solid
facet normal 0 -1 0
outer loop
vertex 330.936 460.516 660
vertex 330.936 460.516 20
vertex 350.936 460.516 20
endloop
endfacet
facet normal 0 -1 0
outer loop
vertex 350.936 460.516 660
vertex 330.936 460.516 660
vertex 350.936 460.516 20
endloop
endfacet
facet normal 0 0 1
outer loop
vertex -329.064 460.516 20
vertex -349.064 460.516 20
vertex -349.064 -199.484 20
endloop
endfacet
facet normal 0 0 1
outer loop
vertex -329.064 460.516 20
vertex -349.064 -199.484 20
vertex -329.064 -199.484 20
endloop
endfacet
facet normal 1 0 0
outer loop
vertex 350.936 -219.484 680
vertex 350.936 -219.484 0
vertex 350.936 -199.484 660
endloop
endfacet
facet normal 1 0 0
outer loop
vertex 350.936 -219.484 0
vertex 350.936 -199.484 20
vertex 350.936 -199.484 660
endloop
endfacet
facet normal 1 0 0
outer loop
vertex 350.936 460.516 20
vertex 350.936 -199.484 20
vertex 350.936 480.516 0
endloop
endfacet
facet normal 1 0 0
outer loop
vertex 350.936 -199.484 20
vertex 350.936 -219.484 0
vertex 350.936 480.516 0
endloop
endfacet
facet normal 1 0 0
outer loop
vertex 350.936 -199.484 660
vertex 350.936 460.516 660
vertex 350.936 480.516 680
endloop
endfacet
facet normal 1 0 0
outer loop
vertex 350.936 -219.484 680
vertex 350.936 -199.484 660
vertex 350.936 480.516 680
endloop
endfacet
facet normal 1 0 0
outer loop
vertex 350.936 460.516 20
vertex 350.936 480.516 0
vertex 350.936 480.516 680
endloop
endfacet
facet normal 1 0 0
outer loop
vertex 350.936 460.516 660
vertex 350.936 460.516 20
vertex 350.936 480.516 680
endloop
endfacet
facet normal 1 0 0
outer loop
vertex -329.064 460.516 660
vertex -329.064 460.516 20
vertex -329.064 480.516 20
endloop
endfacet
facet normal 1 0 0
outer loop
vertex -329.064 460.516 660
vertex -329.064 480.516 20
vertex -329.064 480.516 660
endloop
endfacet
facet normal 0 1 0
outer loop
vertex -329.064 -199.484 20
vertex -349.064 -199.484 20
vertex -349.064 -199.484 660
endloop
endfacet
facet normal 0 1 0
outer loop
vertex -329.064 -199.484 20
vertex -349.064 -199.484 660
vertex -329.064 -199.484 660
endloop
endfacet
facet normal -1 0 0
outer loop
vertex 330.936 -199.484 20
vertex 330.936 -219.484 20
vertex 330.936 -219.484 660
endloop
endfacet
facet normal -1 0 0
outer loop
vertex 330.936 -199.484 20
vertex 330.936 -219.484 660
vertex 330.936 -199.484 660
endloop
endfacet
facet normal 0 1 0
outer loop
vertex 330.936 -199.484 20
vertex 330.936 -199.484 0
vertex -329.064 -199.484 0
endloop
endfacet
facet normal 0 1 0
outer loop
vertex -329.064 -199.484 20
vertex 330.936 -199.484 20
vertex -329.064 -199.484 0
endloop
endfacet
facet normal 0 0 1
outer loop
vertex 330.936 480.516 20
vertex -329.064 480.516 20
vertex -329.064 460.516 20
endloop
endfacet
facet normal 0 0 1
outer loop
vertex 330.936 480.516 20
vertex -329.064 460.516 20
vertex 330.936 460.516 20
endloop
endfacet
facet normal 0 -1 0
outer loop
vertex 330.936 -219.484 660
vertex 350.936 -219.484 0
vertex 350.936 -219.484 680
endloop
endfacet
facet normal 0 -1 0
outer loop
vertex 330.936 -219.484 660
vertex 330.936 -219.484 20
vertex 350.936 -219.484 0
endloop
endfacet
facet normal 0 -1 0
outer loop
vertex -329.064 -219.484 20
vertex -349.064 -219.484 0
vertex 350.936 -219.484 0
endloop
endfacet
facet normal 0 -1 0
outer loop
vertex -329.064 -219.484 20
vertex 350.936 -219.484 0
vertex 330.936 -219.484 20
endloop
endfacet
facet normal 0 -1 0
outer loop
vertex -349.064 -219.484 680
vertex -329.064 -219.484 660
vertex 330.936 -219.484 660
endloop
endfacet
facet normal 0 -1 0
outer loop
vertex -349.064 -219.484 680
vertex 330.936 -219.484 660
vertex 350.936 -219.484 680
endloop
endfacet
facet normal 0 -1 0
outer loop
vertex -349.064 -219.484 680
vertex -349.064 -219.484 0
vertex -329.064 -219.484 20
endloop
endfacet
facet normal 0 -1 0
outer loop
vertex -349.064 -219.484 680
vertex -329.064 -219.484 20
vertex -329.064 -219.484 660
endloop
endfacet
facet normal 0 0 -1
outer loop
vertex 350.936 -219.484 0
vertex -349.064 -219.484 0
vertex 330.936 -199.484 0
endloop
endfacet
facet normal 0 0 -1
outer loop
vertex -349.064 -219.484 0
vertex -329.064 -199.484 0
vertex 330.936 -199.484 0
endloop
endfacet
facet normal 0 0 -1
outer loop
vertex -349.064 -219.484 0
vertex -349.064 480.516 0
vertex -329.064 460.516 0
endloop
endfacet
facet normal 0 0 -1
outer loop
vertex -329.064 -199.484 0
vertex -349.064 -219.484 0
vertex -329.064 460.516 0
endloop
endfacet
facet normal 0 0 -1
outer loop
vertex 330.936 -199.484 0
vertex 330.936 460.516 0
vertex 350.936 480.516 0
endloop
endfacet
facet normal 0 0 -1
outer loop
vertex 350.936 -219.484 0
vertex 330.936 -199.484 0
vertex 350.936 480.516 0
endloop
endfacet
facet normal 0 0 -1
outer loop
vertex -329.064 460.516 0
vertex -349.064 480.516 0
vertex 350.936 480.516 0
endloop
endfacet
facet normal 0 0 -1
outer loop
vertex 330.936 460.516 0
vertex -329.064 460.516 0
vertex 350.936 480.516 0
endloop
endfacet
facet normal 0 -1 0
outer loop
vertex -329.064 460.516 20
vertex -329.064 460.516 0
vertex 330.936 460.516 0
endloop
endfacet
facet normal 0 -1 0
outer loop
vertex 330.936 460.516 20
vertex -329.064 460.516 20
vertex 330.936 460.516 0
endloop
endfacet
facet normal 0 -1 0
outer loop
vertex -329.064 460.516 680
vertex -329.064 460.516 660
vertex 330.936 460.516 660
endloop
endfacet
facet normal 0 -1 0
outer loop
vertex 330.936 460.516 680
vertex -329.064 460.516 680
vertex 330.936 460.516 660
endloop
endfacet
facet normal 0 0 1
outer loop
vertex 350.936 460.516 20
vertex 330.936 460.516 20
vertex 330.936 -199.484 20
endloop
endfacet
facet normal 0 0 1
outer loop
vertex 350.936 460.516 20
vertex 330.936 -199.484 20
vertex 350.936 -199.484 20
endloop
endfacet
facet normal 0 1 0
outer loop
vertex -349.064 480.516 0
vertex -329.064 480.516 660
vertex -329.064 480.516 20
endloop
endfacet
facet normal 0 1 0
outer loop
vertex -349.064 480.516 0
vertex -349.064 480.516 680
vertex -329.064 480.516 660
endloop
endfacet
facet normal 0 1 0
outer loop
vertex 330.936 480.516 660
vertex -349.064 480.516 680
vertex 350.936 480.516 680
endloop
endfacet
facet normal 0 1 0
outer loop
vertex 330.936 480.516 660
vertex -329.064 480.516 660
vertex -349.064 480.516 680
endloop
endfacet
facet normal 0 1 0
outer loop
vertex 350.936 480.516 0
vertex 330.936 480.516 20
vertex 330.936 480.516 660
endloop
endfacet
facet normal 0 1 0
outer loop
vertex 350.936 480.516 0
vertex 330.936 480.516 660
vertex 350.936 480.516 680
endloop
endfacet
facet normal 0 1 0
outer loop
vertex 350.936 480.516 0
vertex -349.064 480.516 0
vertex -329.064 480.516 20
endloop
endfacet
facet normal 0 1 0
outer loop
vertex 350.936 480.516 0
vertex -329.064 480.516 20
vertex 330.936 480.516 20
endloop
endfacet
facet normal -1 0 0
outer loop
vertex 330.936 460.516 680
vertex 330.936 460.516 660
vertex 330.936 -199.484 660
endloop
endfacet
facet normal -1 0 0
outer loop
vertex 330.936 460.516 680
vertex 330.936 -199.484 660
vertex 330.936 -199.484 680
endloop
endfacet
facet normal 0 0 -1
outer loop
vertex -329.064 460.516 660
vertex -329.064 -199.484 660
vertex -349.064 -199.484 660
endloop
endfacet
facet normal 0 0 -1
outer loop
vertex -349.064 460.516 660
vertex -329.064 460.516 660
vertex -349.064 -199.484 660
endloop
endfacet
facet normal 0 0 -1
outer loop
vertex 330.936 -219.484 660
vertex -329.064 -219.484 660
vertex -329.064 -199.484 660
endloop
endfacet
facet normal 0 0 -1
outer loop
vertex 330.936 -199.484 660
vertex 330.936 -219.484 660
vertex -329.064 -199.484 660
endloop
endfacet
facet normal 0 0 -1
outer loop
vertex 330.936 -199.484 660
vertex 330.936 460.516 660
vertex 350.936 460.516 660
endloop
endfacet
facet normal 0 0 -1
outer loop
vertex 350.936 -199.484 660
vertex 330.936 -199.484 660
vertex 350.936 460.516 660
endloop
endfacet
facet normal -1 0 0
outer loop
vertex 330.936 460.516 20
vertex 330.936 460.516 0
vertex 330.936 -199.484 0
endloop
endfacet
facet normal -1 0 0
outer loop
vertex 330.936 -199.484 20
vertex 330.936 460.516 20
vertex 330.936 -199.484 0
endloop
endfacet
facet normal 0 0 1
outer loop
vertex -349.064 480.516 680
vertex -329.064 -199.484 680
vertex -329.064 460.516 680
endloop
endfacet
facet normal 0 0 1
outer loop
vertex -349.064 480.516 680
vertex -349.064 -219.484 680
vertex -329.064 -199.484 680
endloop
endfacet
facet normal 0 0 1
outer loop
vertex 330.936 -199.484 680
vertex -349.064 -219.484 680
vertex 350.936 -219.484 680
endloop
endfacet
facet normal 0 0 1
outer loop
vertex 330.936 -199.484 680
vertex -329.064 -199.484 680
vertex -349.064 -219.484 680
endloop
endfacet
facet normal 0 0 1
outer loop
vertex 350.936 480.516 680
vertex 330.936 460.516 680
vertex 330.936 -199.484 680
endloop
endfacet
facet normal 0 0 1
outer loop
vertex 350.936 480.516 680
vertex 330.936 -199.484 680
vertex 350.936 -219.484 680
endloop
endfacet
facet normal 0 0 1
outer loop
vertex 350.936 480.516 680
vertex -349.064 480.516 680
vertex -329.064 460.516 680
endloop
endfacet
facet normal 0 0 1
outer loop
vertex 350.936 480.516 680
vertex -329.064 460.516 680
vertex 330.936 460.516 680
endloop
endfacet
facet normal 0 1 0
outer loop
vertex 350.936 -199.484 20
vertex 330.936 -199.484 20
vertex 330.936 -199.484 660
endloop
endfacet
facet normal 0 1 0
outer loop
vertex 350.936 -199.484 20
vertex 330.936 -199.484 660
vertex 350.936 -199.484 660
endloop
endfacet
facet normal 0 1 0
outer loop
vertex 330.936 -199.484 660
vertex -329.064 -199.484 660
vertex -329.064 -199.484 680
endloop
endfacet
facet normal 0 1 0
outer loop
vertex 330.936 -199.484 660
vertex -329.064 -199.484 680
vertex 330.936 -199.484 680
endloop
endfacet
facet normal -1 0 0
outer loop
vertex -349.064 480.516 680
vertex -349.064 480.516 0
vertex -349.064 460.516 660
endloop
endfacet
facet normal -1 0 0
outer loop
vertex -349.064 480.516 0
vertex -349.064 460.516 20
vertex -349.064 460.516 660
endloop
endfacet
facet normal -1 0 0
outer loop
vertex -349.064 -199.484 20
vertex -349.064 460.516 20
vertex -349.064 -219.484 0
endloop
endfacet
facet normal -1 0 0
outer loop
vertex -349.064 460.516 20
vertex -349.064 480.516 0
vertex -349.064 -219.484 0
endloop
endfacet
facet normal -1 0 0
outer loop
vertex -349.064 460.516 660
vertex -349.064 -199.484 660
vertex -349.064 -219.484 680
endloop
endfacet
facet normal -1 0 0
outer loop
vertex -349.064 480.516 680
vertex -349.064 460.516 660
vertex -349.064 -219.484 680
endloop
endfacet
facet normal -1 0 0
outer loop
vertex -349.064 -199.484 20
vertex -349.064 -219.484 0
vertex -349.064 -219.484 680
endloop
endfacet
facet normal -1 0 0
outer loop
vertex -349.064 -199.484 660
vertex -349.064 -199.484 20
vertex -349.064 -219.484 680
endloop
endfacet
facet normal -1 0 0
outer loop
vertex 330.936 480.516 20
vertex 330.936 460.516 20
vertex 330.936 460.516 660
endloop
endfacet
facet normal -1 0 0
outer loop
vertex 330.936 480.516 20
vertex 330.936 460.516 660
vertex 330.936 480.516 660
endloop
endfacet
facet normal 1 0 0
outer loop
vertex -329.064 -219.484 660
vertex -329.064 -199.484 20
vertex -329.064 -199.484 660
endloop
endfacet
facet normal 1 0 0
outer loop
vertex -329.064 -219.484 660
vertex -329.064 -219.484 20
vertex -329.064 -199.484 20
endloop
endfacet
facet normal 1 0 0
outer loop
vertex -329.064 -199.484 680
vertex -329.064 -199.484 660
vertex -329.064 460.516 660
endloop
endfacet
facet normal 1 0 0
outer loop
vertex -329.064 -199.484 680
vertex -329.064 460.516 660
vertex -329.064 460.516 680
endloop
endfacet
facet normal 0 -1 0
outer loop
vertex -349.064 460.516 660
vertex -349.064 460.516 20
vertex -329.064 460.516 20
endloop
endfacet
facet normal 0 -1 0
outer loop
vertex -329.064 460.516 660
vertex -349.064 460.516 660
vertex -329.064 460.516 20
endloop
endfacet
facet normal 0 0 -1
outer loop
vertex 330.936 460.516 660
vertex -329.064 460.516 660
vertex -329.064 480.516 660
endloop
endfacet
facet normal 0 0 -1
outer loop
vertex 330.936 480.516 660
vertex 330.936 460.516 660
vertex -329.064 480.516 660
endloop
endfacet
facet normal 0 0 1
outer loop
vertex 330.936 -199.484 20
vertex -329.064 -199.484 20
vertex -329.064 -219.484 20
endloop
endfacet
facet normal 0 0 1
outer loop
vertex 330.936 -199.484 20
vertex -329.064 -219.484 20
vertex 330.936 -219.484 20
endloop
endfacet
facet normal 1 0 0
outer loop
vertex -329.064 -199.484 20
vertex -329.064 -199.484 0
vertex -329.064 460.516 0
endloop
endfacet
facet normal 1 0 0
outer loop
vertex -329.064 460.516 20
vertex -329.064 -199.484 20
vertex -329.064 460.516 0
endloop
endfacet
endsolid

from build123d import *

# Parameters (mm, degrees)
F0_W      = 20
F0_H      = 660
F0_H_2    = 20
F1_DEPTH  = 20
F2_DEPTH  = 680
F3_W      = 20
F3_H      = 20
F4_DEPTH  = 660
F5_W      = 20
F5_H      = 20
F6_DEPTH  = 680
F7_W      = 20
F7_H      = 20
F8_DEPTH  = 660
F9_W      = 20
F9_H      = 20
F10_DEPTH = 660


with BuildPart() as f1:
    # F0 (on Top) → F1 (new body)
    with BuildSketch(Plane.XY):
        Polygon((350.936165, 480.516352), (-329.063835, 480.516352), (-329.063835, 460.516352), (330.936165, 460.516352), (330.936165, -199.483648), (-329.063835, -199.483648), (-329.063835, -219.483648), (350.936165, -219.483648), align=None)
        with Locations((-339.063835, 130.516352)):
            Rectangle(F0_W, F0_H)
        with Locations((-339.063835, 470.516352)):
            Rectangle(F0_W, F0_H_2)
        with Locations((-339.063835, -209.483648)):
            Rectangle(F0_W, F0_H_2)
    extrude(amount=F1_DEPTH)

    # F0 (on Top) → F2 (join)
    with BuildSketch(Plane.XY):
        with Locations((-339.063835, 470.516352)):
            Rectangle(F0_W, F0_H_2)
        with Locations((-339.063835, -209.483648)):
            Rectangle(F0_W, F0_H_2)
    extrude(amount=F2_DEPTH)

    # F3 (on face) → F4 (join)
    with BuildSketch(Plane(origin=(0, -199.483648, 0), x_dir=(-1, 0, 0), z_dir=(0, 1, 0))):
        with Locations((339.063835, 670)):
            Rectangle(F3_W, F3_H)
    extrude(amount=F4_DEPTH)

    # F5 (on face) → F6 (join)
    with BuildSketch(Plane.YZ.offset(-329.063835)):
        with Locations((-209.483648, 670)):
            Rectangle(F5_W, F5_H)
        with Locations((470.516352, 670)):
            Rectangle(F5_W, F5_H)
    extrude(amount=F6_DEPTH)

    # F7 (on face) → F8 (join)
    with BuildSketch(Plane.XY.offset(20)):
        with Locations((340.936165, 470.516352)):
            Rectangle(F7_W, F7_H)
        with Locations((340.936165, -209.483648)):
            Rectangle(F7_W, F7_H)
    extrude(amount=F8_DEPTH)

    # F9 (on face) → F10 (join)
    with BuildSketch(Plane.XZ.offset(-460.516352)):
        with Locations((340.936165, 670)):
            Rectangle(F9_W, F9_H)
    extrude(amount=F10_DEPTH)


solid = f1.part
